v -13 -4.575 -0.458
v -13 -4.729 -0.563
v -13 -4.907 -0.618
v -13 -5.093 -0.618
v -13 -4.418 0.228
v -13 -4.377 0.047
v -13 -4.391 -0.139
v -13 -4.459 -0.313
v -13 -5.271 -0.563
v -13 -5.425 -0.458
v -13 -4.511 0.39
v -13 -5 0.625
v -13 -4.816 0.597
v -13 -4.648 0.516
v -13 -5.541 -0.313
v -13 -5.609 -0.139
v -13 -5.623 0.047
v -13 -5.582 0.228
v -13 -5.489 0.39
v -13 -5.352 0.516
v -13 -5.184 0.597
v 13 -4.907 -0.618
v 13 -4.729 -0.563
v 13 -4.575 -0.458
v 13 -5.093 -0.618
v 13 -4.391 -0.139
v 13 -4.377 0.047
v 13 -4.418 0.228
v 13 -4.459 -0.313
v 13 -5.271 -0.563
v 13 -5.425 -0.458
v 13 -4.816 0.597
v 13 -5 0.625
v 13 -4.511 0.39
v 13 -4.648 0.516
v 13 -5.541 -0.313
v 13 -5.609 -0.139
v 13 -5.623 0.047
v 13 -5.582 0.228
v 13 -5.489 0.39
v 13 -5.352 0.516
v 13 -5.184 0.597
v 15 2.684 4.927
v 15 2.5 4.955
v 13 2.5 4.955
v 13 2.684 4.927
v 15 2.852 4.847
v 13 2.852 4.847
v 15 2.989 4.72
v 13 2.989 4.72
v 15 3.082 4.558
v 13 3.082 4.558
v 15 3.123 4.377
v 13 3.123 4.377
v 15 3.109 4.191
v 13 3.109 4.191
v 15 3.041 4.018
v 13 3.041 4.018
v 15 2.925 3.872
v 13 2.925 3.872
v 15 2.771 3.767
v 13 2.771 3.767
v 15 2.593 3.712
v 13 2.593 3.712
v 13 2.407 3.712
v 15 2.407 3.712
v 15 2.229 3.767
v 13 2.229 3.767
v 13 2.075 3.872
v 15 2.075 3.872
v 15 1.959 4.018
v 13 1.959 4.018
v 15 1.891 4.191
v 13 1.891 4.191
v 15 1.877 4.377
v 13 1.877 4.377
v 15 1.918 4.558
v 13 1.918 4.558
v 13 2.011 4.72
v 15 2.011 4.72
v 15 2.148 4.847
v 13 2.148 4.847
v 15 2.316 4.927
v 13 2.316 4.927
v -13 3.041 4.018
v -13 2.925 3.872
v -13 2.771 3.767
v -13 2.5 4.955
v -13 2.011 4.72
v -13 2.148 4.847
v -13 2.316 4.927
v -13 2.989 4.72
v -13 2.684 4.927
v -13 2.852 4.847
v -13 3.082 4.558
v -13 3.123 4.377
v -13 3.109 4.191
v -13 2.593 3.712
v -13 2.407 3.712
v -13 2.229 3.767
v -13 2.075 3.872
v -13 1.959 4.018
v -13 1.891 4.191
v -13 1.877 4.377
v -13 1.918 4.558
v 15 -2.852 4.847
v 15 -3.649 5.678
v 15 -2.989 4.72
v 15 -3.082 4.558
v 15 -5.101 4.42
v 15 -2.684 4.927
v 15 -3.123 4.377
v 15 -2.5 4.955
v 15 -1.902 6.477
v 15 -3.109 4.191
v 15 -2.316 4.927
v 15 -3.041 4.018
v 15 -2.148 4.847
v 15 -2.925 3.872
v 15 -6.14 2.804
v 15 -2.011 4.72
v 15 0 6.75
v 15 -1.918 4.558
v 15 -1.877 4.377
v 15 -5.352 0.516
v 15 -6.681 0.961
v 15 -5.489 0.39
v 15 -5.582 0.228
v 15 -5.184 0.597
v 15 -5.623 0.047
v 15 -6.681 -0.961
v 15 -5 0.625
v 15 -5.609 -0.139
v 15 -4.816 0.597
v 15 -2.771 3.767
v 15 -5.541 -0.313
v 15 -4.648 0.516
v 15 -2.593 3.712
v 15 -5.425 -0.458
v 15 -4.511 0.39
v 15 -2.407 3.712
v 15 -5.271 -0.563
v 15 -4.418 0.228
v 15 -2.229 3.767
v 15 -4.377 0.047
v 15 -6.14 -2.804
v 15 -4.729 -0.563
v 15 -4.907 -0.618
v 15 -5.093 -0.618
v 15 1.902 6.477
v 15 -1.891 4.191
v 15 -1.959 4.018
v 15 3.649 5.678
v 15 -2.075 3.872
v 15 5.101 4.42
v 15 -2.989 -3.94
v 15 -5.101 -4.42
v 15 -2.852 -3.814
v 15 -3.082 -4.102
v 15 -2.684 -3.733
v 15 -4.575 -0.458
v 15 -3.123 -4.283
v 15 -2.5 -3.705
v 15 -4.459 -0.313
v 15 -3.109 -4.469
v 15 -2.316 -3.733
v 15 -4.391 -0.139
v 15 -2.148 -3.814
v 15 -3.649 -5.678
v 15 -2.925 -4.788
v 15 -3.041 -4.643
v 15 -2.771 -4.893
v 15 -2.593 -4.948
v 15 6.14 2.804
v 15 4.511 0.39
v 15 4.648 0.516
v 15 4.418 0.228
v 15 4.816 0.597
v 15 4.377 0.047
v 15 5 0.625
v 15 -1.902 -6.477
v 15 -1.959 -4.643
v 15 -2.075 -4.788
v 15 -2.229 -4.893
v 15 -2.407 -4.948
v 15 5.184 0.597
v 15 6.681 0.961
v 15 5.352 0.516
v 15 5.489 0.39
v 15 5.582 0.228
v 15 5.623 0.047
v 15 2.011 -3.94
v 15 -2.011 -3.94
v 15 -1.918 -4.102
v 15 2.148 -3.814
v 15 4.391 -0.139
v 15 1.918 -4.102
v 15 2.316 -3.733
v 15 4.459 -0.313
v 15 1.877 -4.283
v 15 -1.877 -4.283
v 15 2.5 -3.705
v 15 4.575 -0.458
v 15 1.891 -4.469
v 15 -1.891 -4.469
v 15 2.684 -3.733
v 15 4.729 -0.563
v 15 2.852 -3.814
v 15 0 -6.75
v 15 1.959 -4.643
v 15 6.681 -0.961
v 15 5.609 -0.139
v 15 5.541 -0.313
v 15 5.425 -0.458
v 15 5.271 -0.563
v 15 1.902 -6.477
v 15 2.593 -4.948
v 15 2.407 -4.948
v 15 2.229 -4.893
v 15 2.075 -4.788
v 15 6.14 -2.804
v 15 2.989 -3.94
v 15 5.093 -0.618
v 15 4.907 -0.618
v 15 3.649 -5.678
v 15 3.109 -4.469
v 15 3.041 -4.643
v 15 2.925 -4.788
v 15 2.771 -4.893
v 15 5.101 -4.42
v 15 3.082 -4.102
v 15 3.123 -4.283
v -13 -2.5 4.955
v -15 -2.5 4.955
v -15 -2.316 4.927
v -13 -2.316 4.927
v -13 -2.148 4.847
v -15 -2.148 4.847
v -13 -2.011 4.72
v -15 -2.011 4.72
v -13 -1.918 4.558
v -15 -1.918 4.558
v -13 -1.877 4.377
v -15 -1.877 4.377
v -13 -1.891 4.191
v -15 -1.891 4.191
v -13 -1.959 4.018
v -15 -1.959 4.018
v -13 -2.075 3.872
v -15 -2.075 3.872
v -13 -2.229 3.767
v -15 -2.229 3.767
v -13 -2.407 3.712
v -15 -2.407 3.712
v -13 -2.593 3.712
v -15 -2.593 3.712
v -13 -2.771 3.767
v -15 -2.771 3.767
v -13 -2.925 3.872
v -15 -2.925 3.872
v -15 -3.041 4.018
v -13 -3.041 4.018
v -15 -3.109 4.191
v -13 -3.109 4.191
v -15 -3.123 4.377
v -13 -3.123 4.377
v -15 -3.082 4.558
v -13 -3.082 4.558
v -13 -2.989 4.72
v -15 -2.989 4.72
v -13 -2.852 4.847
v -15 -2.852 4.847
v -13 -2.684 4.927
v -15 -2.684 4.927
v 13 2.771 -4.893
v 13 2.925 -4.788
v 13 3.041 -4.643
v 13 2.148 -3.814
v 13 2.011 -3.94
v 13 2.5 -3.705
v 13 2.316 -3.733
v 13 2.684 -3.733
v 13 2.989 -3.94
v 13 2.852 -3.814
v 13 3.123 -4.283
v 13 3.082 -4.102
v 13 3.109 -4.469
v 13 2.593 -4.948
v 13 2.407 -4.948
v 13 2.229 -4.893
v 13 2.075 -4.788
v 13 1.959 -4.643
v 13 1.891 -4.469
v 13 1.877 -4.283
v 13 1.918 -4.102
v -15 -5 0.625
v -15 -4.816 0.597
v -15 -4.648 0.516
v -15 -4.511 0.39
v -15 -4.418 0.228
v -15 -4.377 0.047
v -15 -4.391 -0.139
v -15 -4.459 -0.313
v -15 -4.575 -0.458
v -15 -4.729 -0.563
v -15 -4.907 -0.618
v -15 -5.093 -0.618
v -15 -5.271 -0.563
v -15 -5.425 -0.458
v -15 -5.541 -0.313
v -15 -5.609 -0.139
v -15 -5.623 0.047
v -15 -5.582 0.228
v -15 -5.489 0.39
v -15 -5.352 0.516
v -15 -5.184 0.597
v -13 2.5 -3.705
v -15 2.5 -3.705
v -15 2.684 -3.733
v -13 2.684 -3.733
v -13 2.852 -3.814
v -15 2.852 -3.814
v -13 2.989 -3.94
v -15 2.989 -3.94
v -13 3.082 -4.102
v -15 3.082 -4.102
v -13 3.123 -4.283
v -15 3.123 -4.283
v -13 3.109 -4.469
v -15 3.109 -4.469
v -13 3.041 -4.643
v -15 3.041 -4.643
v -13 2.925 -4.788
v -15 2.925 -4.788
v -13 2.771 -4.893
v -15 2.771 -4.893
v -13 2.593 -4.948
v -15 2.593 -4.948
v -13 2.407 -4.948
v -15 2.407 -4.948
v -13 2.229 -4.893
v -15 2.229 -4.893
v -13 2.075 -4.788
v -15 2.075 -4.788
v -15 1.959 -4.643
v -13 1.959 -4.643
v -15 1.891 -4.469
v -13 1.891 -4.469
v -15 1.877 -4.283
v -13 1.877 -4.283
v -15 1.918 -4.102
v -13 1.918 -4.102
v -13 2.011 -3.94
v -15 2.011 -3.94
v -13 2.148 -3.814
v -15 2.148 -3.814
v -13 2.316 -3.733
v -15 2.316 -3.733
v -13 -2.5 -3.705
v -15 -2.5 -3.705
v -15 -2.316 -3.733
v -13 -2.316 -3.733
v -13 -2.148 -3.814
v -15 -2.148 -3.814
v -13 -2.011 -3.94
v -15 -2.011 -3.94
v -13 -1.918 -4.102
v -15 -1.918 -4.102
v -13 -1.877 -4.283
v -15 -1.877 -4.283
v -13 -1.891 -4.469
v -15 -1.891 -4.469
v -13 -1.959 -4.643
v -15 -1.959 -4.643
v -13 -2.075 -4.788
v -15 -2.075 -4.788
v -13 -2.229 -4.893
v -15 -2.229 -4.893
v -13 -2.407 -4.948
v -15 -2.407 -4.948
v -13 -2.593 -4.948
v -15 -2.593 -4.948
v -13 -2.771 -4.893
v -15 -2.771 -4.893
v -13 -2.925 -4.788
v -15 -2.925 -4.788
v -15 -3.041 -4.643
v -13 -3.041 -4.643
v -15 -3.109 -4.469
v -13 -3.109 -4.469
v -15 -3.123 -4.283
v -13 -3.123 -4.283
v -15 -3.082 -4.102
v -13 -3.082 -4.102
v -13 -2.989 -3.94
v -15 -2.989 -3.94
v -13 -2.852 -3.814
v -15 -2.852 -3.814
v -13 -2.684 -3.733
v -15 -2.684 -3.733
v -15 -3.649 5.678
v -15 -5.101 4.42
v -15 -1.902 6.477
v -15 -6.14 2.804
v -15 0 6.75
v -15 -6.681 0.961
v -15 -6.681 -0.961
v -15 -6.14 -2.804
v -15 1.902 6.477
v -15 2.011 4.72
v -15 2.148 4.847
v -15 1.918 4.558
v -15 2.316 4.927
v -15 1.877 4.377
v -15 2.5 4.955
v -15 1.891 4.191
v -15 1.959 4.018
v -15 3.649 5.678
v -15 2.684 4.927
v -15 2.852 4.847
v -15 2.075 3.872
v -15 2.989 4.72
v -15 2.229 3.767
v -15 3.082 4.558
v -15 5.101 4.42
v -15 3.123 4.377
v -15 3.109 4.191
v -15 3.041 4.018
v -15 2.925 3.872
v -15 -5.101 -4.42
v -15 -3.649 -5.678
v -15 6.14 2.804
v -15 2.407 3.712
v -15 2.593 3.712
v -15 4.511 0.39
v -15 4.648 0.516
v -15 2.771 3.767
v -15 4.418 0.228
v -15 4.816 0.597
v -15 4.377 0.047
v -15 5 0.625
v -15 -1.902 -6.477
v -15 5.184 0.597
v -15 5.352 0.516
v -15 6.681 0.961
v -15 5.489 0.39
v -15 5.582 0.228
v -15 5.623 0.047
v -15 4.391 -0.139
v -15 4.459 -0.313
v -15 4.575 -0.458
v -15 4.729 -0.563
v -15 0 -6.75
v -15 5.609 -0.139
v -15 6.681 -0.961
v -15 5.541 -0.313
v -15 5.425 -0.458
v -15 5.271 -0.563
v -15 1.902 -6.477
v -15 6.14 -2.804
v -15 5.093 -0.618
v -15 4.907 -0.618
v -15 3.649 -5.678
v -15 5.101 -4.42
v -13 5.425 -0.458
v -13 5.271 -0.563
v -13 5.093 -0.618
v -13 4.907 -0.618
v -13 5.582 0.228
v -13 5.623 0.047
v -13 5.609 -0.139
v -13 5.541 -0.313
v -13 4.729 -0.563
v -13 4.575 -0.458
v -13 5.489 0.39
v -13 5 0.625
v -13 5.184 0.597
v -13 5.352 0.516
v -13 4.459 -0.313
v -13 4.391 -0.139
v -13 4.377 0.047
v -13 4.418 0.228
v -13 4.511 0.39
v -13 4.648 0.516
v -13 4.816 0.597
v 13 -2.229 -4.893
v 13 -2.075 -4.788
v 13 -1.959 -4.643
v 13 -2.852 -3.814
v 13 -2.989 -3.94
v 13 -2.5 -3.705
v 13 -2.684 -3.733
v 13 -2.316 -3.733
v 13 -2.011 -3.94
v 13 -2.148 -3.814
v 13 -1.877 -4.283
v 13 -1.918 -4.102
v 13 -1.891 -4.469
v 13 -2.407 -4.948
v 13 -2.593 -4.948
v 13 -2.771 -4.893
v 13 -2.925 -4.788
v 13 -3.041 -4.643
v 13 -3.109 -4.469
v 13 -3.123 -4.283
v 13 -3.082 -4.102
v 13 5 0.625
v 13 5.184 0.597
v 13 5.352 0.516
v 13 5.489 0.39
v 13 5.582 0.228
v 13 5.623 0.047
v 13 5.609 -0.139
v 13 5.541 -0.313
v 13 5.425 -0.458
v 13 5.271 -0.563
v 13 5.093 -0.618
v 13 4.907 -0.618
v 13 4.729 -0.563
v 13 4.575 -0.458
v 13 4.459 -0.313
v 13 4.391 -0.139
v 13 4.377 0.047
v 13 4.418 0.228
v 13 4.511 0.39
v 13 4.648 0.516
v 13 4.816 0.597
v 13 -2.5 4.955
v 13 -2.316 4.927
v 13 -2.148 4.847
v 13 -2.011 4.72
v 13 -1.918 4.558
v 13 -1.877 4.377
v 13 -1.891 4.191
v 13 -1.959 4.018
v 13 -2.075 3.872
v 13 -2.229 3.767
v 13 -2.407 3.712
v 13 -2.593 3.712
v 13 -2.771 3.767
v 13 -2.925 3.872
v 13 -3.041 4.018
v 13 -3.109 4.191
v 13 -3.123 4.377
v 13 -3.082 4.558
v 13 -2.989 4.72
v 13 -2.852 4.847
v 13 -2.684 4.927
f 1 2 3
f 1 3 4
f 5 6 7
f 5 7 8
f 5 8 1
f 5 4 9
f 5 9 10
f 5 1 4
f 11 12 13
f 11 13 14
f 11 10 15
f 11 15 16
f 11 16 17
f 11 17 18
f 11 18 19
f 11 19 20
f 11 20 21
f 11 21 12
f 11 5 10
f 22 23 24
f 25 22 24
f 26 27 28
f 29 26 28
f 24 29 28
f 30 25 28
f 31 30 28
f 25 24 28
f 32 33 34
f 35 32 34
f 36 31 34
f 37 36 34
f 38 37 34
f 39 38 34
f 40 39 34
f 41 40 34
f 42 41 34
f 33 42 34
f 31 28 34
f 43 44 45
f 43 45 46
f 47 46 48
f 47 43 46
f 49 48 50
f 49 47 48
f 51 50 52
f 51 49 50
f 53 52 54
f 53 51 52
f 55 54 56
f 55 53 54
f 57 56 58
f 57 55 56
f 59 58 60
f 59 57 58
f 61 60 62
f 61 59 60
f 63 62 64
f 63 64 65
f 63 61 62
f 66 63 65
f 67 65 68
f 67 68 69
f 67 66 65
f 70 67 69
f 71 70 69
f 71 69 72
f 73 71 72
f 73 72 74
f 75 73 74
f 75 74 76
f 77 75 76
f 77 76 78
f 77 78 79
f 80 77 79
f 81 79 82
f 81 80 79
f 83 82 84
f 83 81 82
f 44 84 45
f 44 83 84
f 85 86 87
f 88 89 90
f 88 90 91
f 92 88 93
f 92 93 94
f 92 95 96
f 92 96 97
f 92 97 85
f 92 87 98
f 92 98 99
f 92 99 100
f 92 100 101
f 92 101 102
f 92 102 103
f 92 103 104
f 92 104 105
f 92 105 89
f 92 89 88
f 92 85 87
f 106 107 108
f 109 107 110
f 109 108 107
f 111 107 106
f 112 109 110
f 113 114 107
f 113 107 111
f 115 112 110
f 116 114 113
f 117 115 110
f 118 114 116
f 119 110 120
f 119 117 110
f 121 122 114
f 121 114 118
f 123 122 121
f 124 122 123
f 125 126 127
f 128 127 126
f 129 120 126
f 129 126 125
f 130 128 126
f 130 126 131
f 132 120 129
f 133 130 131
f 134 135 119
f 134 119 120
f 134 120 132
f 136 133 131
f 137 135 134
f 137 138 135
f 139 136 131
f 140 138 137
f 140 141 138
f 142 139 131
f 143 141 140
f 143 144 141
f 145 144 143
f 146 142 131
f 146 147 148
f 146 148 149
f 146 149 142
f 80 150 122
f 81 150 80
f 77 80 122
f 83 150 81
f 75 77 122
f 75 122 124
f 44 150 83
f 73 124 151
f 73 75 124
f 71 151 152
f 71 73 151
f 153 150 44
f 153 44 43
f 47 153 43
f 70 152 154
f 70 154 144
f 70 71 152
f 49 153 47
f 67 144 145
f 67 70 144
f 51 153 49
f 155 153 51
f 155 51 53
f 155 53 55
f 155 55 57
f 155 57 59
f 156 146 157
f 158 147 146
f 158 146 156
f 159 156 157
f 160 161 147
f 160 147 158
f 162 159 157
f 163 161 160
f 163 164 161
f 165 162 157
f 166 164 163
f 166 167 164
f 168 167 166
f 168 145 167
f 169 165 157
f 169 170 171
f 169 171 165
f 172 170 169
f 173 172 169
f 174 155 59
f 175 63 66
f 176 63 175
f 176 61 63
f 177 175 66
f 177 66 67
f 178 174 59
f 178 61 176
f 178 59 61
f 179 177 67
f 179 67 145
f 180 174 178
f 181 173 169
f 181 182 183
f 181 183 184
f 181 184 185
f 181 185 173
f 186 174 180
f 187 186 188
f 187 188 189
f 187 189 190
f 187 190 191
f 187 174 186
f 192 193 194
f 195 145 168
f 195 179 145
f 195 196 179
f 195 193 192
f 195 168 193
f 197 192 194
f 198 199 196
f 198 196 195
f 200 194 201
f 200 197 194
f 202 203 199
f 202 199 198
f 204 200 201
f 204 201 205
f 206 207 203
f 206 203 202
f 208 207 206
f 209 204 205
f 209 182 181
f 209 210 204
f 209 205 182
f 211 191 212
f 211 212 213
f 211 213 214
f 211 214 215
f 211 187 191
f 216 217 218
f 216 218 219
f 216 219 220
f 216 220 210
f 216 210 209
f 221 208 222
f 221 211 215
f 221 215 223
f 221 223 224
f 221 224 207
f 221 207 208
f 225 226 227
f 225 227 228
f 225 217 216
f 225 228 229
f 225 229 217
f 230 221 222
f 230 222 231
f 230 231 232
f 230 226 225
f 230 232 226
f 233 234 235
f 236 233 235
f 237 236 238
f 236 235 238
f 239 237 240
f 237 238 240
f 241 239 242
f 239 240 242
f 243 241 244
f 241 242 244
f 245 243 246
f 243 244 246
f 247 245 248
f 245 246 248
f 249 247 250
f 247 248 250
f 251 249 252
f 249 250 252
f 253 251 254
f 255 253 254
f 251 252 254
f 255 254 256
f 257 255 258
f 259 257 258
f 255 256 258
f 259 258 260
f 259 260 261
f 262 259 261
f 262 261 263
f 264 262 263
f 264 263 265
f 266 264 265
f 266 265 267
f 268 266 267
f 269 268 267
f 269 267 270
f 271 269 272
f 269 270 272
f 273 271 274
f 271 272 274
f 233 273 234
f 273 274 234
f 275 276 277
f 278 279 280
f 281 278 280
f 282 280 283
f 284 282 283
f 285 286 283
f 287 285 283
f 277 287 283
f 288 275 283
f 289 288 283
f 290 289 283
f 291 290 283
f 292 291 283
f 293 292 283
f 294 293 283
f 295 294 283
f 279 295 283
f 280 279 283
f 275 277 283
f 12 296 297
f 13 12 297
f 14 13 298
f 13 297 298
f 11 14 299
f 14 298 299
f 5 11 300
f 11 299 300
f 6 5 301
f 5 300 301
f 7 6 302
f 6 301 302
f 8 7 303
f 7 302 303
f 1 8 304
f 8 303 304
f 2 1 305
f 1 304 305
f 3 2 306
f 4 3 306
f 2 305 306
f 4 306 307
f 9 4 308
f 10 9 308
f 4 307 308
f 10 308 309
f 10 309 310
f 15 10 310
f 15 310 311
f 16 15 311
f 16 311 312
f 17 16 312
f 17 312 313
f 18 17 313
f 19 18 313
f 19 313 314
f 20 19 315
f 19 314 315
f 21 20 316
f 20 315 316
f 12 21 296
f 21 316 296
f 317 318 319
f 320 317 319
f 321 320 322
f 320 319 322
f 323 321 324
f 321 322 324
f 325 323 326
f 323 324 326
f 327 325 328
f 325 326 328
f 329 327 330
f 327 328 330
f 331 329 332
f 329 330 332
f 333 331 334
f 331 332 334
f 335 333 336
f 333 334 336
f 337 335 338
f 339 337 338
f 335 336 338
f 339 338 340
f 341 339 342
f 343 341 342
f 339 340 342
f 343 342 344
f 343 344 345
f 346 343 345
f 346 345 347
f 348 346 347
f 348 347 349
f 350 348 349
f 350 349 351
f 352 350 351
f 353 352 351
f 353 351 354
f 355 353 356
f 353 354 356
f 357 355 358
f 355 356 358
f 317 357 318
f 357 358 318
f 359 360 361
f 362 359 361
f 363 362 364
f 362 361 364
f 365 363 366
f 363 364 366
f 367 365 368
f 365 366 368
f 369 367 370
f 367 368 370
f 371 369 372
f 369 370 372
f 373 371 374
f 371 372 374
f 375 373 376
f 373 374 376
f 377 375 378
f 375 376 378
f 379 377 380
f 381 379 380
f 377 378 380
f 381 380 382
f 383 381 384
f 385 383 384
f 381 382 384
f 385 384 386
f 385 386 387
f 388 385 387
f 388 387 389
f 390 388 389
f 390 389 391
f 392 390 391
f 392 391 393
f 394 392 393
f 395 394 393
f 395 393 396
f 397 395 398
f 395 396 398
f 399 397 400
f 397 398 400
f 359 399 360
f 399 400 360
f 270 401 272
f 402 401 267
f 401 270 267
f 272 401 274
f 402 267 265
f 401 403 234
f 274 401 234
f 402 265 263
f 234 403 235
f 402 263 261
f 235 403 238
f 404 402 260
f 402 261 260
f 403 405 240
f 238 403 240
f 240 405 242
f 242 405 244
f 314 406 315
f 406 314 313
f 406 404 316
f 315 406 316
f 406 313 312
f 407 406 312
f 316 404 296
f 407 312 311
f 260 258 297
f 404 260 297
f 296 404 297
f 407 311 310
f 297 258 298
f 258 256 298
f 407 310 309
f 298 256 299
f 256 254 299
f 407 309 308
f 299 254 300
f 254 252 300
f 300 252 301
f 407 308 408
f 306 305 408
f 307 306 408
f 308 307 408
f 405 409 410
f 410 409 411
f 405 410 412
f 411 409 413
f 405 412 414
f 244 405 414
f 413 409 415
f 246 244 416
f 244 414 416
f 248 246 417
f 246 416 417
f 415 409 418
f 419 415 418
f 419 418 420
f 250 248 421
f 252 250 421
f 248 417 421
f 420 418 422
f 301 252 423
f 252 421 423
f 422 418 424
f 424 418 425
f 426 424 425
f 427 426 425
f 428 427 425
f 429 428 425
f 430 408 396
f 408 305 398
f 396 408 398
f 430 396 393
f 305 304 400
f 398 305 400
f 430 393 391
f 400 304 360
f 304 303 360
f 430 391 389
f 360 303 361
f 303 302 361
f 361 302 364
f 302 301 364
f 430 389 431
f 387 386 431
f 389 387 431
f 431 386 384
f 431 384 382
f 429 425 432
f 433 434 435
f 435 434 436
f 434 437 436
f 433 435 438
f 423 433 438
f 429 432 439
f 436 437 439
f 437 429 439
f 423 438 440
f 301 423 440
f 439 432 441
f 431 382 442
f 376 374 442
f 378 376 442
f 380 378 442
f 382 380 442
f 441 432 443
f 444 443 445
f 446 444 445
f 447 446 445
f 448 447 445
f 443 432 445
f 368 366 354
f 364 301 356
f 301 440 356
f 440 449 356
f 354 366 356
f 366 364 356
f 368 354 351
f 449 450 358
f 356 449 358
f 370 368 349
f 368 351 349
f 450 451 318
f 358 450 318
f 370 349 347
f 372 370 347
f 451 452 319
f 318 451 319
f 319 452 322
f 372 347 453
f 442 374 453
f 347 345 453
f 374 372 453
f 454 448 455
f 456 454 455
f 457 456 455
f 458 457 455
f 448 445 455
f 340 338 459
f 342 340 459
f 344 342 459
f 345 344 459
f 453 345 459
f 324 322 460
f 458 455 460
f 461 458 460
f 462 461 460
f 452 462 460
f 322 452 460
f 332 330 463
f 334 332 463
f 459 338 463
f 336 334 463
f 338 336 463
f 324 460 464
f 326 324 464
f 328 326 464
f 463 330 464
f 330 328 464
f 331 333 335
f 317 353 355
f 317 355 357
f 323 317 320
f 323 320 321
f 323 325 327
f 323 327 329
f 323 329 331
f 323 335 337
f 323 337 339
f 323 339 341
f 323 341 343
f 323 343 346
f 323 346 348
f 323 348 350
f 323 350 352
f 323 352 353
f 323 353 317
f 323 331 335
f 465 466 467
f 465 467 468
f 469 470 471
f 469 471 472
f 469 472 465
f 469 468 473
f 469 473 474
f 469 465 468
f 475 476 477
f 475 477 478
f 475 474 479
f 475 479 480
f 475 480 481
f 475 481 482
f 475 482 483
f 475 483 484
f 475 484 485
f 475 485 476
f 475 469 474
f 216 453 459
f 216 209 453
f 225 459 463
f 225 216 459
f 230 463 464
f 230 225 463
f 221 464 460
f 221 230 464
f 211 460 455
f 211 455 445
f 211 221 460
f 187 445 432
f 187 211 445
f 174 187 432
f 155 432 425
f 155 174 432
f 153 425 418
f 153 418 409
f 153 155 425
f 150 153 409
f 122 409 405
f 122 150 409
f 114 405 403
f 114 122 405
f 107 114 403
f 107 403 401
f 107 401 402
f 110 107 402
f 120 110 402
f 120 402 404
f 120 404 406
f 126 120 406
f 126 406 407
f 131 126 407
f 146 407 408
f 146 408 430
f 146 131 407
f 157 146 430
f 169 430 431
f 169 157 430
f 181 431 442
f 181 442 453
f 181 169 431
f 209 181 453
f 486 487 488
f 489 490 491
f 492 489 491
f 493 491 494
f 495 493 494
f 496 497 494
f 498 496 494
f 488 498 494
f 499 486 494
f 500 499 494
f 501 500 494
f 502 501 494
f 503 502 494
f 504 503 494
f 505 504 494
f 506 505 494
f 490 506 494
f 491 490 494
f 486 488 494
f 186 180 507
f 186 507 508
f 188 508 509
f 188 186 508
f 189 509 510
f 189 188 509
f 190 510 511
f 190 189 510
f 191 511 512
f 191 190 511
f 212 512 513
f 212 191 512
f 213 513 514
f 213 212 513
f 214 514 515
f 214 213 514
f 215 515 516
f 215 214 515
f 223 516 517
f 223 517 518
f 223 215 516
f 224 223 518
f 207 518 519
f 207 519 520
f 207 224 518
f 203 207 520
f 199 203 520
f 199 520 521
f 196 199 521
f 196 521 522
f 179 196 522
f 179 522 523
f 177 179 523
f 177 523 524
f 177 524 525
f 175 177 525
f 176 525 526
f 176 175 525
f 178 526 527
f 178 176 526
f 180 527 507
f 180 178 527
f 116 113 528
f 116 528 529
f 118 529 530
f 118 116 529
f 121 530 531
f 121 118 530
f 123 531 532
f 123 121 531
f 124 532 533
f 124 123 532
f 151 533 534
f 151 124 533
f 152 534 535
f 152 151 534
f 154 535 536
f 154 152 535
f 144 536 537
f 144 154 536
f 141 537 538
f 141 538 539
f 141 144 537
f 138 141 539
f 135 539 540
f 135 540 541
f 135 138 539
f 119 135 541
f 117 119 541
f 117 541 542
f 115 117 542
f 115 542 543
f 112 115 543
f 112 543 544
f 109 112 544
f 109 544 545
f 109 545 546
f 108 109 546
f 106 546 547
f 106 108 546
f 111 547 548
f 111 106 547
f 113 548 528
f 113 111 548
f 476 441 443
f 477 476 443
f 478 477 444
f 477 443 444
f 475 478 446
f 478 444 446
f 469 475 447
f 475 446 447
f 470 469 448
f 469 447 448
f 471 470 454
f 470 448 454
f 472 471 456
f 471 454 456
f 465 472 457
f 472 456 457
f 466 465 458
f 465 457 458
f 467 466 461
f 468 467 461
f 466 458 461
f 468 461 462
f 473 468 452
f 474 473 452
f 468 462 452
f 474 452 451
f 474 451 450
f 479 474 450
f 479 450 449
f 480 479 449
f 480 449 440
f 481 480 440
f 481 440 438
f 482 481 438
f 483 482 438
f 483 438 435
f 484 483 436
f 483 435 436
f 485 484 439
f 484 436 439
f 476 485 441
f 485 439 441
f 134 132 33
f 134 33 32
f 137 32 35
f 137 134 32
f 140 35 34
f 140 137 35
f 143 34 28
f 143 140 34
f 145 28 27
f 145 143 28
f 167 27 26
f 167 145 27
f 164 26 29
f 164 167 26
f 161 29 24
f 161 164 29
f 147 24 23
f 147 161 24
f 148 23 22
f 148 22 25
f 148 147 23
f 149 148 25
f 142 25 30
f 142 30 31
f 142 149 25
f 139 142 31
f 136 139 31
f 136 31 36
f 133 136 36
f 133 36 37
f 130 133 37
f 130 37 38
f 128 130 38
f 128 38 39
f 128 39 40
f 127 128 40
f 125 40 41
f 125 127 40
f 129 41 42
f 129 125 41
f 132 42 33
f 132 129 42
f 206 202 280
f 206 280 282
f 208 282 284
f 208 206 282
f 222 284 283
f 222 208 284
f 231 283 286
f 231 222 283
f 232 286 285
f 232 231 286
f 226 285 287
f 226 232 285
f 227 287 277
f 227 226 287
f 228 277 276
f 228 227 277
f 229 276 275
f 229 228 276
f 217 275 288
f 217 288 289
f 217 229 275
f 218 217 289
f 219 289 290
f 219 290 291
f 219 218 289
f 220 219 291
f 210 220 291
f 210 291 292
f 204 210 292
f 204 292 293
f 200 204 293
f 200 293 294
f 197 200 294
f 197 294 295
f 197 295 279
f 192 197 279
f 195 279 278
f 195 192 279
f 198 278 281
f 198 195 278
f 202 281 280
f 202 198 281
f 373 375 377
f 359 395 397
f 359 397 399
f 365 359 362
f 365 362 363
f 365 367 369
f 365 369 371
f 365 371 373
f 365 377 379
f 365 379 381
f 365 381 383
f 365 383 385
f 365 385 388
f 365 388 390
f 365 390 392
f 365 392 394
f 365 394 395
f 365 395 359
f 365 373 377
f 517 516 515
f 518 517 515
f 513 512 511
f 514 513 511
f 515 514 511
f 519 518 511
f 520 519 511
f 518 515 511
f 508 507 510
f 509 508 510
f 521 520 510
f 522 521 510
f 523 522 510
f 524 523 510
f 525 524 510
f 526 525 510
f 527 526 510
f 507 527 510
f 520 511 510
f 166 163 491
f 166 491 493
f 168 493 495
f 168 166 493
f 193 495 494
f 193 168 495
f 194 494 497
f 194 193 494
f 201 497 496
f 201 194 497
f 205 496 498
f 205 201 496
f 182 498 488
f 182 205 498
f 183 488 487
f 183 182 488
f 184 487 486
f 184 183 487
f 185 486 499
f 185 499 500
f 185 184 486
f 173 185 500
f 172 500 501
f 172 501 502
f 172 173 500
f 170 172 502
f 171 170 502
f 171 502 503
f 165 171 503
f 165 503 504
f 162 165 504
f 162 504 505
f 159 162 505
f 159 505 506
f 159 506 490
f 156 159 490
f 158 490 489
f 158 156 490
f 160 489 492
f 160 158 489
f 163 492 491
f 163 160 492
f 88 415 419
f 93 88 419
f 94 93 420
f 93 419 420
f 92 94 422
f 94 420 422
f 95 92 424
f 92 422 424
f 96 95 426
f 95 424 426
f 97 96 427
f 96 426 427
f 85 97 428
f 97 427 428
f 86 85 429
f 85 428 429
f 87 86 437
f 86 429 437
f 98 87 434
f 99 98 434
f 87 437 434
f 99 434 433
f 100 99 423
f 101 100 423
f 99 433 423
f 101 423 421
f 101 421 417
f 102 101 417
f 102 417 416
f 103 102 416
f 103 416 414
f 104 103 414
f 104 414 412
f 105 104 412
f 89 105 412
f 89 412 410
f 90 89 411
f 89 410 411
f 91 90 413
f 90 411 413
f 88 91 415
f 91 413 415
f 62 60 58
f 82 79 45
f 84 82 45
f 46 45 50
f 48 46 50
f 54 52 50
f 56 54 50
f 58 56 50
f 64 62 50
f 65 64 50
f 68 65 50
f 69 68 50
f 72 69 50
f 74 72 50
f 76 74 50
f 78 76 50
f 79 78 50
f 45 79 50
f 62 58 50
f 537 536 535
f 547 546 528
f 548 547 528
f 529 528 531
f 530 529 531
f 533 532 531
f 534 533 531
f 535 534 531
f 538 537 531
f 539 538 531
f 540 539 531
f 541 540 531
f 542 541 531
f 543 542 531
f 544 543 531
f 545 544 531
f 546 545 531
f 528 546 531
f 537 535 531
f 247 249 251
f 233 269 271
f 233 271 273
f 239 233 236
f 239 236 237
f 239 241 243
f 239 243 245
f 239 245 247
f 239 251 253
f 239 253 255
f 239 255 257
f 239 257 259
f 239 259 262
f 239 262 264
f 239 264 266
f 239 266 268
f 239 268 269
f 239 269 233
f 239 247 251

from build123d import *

# Parameters (mm, degrees)
SKETCH1_R           = 13.5
BOSS_EXTRUDE1_DEPTH = 30
SKETCH2_R           = 1.25
CUT_EXTRUDE1_DEPTH  = 4
SCALE1_SCALE        = 0.5


with BuildPart() as part:
    # Sketch1 → Boss-Extrude1 (new, symmetric)
    with BuildSketch(Plane(origin=(0, 0, 0), x_dir=(0, 0, -1), z_dir=(1, 0, 0))):
        Circle(SKETCH1_R)
    extrude(amount=BOSS_EXTRUDE1_DEPTH, both=True)

    # Sketch2 → Cut-Extrude1 (cut)
    with BuildSketch(Plane.ZY.offset(30)):
        with Locations((0, 10)):
            Circle(SKETCH2_R)
        with Locations((8.660254038, 5)):
            Circle(SKETCH2_R)
        with Locations((8.660254038, -5)):
            Circle(SKETCH2_R)
        with Locations((0, -10)):
            Circle(SKETCH2_R)
        with Locations((-8.660254038, -5)):
            Circle(SKETCH2_R)
        with Locations((-8.660254038, 5)):
            Circle(SKETCH2_R)
    cut_extrude1 = extrude(amount=-CUT_EXTRUDE1_DEPTH, mode=Mode.SUBTRACT)

    # Mirror1: Cut-Extrude1 across plane
    add(cut_extrude1.mirror(Plane(origin=(0, 0, 0), x_dir=(0, 0, 1), z_dir=(1, 0, 0))), mode=Mode.SUBTRACT)


with BuildPart() as part_1:
    # Scale1: scaled about (0, 0, 0)
    add(part.part.scale(SCALE1_SCALE))


solid = part_1.part
